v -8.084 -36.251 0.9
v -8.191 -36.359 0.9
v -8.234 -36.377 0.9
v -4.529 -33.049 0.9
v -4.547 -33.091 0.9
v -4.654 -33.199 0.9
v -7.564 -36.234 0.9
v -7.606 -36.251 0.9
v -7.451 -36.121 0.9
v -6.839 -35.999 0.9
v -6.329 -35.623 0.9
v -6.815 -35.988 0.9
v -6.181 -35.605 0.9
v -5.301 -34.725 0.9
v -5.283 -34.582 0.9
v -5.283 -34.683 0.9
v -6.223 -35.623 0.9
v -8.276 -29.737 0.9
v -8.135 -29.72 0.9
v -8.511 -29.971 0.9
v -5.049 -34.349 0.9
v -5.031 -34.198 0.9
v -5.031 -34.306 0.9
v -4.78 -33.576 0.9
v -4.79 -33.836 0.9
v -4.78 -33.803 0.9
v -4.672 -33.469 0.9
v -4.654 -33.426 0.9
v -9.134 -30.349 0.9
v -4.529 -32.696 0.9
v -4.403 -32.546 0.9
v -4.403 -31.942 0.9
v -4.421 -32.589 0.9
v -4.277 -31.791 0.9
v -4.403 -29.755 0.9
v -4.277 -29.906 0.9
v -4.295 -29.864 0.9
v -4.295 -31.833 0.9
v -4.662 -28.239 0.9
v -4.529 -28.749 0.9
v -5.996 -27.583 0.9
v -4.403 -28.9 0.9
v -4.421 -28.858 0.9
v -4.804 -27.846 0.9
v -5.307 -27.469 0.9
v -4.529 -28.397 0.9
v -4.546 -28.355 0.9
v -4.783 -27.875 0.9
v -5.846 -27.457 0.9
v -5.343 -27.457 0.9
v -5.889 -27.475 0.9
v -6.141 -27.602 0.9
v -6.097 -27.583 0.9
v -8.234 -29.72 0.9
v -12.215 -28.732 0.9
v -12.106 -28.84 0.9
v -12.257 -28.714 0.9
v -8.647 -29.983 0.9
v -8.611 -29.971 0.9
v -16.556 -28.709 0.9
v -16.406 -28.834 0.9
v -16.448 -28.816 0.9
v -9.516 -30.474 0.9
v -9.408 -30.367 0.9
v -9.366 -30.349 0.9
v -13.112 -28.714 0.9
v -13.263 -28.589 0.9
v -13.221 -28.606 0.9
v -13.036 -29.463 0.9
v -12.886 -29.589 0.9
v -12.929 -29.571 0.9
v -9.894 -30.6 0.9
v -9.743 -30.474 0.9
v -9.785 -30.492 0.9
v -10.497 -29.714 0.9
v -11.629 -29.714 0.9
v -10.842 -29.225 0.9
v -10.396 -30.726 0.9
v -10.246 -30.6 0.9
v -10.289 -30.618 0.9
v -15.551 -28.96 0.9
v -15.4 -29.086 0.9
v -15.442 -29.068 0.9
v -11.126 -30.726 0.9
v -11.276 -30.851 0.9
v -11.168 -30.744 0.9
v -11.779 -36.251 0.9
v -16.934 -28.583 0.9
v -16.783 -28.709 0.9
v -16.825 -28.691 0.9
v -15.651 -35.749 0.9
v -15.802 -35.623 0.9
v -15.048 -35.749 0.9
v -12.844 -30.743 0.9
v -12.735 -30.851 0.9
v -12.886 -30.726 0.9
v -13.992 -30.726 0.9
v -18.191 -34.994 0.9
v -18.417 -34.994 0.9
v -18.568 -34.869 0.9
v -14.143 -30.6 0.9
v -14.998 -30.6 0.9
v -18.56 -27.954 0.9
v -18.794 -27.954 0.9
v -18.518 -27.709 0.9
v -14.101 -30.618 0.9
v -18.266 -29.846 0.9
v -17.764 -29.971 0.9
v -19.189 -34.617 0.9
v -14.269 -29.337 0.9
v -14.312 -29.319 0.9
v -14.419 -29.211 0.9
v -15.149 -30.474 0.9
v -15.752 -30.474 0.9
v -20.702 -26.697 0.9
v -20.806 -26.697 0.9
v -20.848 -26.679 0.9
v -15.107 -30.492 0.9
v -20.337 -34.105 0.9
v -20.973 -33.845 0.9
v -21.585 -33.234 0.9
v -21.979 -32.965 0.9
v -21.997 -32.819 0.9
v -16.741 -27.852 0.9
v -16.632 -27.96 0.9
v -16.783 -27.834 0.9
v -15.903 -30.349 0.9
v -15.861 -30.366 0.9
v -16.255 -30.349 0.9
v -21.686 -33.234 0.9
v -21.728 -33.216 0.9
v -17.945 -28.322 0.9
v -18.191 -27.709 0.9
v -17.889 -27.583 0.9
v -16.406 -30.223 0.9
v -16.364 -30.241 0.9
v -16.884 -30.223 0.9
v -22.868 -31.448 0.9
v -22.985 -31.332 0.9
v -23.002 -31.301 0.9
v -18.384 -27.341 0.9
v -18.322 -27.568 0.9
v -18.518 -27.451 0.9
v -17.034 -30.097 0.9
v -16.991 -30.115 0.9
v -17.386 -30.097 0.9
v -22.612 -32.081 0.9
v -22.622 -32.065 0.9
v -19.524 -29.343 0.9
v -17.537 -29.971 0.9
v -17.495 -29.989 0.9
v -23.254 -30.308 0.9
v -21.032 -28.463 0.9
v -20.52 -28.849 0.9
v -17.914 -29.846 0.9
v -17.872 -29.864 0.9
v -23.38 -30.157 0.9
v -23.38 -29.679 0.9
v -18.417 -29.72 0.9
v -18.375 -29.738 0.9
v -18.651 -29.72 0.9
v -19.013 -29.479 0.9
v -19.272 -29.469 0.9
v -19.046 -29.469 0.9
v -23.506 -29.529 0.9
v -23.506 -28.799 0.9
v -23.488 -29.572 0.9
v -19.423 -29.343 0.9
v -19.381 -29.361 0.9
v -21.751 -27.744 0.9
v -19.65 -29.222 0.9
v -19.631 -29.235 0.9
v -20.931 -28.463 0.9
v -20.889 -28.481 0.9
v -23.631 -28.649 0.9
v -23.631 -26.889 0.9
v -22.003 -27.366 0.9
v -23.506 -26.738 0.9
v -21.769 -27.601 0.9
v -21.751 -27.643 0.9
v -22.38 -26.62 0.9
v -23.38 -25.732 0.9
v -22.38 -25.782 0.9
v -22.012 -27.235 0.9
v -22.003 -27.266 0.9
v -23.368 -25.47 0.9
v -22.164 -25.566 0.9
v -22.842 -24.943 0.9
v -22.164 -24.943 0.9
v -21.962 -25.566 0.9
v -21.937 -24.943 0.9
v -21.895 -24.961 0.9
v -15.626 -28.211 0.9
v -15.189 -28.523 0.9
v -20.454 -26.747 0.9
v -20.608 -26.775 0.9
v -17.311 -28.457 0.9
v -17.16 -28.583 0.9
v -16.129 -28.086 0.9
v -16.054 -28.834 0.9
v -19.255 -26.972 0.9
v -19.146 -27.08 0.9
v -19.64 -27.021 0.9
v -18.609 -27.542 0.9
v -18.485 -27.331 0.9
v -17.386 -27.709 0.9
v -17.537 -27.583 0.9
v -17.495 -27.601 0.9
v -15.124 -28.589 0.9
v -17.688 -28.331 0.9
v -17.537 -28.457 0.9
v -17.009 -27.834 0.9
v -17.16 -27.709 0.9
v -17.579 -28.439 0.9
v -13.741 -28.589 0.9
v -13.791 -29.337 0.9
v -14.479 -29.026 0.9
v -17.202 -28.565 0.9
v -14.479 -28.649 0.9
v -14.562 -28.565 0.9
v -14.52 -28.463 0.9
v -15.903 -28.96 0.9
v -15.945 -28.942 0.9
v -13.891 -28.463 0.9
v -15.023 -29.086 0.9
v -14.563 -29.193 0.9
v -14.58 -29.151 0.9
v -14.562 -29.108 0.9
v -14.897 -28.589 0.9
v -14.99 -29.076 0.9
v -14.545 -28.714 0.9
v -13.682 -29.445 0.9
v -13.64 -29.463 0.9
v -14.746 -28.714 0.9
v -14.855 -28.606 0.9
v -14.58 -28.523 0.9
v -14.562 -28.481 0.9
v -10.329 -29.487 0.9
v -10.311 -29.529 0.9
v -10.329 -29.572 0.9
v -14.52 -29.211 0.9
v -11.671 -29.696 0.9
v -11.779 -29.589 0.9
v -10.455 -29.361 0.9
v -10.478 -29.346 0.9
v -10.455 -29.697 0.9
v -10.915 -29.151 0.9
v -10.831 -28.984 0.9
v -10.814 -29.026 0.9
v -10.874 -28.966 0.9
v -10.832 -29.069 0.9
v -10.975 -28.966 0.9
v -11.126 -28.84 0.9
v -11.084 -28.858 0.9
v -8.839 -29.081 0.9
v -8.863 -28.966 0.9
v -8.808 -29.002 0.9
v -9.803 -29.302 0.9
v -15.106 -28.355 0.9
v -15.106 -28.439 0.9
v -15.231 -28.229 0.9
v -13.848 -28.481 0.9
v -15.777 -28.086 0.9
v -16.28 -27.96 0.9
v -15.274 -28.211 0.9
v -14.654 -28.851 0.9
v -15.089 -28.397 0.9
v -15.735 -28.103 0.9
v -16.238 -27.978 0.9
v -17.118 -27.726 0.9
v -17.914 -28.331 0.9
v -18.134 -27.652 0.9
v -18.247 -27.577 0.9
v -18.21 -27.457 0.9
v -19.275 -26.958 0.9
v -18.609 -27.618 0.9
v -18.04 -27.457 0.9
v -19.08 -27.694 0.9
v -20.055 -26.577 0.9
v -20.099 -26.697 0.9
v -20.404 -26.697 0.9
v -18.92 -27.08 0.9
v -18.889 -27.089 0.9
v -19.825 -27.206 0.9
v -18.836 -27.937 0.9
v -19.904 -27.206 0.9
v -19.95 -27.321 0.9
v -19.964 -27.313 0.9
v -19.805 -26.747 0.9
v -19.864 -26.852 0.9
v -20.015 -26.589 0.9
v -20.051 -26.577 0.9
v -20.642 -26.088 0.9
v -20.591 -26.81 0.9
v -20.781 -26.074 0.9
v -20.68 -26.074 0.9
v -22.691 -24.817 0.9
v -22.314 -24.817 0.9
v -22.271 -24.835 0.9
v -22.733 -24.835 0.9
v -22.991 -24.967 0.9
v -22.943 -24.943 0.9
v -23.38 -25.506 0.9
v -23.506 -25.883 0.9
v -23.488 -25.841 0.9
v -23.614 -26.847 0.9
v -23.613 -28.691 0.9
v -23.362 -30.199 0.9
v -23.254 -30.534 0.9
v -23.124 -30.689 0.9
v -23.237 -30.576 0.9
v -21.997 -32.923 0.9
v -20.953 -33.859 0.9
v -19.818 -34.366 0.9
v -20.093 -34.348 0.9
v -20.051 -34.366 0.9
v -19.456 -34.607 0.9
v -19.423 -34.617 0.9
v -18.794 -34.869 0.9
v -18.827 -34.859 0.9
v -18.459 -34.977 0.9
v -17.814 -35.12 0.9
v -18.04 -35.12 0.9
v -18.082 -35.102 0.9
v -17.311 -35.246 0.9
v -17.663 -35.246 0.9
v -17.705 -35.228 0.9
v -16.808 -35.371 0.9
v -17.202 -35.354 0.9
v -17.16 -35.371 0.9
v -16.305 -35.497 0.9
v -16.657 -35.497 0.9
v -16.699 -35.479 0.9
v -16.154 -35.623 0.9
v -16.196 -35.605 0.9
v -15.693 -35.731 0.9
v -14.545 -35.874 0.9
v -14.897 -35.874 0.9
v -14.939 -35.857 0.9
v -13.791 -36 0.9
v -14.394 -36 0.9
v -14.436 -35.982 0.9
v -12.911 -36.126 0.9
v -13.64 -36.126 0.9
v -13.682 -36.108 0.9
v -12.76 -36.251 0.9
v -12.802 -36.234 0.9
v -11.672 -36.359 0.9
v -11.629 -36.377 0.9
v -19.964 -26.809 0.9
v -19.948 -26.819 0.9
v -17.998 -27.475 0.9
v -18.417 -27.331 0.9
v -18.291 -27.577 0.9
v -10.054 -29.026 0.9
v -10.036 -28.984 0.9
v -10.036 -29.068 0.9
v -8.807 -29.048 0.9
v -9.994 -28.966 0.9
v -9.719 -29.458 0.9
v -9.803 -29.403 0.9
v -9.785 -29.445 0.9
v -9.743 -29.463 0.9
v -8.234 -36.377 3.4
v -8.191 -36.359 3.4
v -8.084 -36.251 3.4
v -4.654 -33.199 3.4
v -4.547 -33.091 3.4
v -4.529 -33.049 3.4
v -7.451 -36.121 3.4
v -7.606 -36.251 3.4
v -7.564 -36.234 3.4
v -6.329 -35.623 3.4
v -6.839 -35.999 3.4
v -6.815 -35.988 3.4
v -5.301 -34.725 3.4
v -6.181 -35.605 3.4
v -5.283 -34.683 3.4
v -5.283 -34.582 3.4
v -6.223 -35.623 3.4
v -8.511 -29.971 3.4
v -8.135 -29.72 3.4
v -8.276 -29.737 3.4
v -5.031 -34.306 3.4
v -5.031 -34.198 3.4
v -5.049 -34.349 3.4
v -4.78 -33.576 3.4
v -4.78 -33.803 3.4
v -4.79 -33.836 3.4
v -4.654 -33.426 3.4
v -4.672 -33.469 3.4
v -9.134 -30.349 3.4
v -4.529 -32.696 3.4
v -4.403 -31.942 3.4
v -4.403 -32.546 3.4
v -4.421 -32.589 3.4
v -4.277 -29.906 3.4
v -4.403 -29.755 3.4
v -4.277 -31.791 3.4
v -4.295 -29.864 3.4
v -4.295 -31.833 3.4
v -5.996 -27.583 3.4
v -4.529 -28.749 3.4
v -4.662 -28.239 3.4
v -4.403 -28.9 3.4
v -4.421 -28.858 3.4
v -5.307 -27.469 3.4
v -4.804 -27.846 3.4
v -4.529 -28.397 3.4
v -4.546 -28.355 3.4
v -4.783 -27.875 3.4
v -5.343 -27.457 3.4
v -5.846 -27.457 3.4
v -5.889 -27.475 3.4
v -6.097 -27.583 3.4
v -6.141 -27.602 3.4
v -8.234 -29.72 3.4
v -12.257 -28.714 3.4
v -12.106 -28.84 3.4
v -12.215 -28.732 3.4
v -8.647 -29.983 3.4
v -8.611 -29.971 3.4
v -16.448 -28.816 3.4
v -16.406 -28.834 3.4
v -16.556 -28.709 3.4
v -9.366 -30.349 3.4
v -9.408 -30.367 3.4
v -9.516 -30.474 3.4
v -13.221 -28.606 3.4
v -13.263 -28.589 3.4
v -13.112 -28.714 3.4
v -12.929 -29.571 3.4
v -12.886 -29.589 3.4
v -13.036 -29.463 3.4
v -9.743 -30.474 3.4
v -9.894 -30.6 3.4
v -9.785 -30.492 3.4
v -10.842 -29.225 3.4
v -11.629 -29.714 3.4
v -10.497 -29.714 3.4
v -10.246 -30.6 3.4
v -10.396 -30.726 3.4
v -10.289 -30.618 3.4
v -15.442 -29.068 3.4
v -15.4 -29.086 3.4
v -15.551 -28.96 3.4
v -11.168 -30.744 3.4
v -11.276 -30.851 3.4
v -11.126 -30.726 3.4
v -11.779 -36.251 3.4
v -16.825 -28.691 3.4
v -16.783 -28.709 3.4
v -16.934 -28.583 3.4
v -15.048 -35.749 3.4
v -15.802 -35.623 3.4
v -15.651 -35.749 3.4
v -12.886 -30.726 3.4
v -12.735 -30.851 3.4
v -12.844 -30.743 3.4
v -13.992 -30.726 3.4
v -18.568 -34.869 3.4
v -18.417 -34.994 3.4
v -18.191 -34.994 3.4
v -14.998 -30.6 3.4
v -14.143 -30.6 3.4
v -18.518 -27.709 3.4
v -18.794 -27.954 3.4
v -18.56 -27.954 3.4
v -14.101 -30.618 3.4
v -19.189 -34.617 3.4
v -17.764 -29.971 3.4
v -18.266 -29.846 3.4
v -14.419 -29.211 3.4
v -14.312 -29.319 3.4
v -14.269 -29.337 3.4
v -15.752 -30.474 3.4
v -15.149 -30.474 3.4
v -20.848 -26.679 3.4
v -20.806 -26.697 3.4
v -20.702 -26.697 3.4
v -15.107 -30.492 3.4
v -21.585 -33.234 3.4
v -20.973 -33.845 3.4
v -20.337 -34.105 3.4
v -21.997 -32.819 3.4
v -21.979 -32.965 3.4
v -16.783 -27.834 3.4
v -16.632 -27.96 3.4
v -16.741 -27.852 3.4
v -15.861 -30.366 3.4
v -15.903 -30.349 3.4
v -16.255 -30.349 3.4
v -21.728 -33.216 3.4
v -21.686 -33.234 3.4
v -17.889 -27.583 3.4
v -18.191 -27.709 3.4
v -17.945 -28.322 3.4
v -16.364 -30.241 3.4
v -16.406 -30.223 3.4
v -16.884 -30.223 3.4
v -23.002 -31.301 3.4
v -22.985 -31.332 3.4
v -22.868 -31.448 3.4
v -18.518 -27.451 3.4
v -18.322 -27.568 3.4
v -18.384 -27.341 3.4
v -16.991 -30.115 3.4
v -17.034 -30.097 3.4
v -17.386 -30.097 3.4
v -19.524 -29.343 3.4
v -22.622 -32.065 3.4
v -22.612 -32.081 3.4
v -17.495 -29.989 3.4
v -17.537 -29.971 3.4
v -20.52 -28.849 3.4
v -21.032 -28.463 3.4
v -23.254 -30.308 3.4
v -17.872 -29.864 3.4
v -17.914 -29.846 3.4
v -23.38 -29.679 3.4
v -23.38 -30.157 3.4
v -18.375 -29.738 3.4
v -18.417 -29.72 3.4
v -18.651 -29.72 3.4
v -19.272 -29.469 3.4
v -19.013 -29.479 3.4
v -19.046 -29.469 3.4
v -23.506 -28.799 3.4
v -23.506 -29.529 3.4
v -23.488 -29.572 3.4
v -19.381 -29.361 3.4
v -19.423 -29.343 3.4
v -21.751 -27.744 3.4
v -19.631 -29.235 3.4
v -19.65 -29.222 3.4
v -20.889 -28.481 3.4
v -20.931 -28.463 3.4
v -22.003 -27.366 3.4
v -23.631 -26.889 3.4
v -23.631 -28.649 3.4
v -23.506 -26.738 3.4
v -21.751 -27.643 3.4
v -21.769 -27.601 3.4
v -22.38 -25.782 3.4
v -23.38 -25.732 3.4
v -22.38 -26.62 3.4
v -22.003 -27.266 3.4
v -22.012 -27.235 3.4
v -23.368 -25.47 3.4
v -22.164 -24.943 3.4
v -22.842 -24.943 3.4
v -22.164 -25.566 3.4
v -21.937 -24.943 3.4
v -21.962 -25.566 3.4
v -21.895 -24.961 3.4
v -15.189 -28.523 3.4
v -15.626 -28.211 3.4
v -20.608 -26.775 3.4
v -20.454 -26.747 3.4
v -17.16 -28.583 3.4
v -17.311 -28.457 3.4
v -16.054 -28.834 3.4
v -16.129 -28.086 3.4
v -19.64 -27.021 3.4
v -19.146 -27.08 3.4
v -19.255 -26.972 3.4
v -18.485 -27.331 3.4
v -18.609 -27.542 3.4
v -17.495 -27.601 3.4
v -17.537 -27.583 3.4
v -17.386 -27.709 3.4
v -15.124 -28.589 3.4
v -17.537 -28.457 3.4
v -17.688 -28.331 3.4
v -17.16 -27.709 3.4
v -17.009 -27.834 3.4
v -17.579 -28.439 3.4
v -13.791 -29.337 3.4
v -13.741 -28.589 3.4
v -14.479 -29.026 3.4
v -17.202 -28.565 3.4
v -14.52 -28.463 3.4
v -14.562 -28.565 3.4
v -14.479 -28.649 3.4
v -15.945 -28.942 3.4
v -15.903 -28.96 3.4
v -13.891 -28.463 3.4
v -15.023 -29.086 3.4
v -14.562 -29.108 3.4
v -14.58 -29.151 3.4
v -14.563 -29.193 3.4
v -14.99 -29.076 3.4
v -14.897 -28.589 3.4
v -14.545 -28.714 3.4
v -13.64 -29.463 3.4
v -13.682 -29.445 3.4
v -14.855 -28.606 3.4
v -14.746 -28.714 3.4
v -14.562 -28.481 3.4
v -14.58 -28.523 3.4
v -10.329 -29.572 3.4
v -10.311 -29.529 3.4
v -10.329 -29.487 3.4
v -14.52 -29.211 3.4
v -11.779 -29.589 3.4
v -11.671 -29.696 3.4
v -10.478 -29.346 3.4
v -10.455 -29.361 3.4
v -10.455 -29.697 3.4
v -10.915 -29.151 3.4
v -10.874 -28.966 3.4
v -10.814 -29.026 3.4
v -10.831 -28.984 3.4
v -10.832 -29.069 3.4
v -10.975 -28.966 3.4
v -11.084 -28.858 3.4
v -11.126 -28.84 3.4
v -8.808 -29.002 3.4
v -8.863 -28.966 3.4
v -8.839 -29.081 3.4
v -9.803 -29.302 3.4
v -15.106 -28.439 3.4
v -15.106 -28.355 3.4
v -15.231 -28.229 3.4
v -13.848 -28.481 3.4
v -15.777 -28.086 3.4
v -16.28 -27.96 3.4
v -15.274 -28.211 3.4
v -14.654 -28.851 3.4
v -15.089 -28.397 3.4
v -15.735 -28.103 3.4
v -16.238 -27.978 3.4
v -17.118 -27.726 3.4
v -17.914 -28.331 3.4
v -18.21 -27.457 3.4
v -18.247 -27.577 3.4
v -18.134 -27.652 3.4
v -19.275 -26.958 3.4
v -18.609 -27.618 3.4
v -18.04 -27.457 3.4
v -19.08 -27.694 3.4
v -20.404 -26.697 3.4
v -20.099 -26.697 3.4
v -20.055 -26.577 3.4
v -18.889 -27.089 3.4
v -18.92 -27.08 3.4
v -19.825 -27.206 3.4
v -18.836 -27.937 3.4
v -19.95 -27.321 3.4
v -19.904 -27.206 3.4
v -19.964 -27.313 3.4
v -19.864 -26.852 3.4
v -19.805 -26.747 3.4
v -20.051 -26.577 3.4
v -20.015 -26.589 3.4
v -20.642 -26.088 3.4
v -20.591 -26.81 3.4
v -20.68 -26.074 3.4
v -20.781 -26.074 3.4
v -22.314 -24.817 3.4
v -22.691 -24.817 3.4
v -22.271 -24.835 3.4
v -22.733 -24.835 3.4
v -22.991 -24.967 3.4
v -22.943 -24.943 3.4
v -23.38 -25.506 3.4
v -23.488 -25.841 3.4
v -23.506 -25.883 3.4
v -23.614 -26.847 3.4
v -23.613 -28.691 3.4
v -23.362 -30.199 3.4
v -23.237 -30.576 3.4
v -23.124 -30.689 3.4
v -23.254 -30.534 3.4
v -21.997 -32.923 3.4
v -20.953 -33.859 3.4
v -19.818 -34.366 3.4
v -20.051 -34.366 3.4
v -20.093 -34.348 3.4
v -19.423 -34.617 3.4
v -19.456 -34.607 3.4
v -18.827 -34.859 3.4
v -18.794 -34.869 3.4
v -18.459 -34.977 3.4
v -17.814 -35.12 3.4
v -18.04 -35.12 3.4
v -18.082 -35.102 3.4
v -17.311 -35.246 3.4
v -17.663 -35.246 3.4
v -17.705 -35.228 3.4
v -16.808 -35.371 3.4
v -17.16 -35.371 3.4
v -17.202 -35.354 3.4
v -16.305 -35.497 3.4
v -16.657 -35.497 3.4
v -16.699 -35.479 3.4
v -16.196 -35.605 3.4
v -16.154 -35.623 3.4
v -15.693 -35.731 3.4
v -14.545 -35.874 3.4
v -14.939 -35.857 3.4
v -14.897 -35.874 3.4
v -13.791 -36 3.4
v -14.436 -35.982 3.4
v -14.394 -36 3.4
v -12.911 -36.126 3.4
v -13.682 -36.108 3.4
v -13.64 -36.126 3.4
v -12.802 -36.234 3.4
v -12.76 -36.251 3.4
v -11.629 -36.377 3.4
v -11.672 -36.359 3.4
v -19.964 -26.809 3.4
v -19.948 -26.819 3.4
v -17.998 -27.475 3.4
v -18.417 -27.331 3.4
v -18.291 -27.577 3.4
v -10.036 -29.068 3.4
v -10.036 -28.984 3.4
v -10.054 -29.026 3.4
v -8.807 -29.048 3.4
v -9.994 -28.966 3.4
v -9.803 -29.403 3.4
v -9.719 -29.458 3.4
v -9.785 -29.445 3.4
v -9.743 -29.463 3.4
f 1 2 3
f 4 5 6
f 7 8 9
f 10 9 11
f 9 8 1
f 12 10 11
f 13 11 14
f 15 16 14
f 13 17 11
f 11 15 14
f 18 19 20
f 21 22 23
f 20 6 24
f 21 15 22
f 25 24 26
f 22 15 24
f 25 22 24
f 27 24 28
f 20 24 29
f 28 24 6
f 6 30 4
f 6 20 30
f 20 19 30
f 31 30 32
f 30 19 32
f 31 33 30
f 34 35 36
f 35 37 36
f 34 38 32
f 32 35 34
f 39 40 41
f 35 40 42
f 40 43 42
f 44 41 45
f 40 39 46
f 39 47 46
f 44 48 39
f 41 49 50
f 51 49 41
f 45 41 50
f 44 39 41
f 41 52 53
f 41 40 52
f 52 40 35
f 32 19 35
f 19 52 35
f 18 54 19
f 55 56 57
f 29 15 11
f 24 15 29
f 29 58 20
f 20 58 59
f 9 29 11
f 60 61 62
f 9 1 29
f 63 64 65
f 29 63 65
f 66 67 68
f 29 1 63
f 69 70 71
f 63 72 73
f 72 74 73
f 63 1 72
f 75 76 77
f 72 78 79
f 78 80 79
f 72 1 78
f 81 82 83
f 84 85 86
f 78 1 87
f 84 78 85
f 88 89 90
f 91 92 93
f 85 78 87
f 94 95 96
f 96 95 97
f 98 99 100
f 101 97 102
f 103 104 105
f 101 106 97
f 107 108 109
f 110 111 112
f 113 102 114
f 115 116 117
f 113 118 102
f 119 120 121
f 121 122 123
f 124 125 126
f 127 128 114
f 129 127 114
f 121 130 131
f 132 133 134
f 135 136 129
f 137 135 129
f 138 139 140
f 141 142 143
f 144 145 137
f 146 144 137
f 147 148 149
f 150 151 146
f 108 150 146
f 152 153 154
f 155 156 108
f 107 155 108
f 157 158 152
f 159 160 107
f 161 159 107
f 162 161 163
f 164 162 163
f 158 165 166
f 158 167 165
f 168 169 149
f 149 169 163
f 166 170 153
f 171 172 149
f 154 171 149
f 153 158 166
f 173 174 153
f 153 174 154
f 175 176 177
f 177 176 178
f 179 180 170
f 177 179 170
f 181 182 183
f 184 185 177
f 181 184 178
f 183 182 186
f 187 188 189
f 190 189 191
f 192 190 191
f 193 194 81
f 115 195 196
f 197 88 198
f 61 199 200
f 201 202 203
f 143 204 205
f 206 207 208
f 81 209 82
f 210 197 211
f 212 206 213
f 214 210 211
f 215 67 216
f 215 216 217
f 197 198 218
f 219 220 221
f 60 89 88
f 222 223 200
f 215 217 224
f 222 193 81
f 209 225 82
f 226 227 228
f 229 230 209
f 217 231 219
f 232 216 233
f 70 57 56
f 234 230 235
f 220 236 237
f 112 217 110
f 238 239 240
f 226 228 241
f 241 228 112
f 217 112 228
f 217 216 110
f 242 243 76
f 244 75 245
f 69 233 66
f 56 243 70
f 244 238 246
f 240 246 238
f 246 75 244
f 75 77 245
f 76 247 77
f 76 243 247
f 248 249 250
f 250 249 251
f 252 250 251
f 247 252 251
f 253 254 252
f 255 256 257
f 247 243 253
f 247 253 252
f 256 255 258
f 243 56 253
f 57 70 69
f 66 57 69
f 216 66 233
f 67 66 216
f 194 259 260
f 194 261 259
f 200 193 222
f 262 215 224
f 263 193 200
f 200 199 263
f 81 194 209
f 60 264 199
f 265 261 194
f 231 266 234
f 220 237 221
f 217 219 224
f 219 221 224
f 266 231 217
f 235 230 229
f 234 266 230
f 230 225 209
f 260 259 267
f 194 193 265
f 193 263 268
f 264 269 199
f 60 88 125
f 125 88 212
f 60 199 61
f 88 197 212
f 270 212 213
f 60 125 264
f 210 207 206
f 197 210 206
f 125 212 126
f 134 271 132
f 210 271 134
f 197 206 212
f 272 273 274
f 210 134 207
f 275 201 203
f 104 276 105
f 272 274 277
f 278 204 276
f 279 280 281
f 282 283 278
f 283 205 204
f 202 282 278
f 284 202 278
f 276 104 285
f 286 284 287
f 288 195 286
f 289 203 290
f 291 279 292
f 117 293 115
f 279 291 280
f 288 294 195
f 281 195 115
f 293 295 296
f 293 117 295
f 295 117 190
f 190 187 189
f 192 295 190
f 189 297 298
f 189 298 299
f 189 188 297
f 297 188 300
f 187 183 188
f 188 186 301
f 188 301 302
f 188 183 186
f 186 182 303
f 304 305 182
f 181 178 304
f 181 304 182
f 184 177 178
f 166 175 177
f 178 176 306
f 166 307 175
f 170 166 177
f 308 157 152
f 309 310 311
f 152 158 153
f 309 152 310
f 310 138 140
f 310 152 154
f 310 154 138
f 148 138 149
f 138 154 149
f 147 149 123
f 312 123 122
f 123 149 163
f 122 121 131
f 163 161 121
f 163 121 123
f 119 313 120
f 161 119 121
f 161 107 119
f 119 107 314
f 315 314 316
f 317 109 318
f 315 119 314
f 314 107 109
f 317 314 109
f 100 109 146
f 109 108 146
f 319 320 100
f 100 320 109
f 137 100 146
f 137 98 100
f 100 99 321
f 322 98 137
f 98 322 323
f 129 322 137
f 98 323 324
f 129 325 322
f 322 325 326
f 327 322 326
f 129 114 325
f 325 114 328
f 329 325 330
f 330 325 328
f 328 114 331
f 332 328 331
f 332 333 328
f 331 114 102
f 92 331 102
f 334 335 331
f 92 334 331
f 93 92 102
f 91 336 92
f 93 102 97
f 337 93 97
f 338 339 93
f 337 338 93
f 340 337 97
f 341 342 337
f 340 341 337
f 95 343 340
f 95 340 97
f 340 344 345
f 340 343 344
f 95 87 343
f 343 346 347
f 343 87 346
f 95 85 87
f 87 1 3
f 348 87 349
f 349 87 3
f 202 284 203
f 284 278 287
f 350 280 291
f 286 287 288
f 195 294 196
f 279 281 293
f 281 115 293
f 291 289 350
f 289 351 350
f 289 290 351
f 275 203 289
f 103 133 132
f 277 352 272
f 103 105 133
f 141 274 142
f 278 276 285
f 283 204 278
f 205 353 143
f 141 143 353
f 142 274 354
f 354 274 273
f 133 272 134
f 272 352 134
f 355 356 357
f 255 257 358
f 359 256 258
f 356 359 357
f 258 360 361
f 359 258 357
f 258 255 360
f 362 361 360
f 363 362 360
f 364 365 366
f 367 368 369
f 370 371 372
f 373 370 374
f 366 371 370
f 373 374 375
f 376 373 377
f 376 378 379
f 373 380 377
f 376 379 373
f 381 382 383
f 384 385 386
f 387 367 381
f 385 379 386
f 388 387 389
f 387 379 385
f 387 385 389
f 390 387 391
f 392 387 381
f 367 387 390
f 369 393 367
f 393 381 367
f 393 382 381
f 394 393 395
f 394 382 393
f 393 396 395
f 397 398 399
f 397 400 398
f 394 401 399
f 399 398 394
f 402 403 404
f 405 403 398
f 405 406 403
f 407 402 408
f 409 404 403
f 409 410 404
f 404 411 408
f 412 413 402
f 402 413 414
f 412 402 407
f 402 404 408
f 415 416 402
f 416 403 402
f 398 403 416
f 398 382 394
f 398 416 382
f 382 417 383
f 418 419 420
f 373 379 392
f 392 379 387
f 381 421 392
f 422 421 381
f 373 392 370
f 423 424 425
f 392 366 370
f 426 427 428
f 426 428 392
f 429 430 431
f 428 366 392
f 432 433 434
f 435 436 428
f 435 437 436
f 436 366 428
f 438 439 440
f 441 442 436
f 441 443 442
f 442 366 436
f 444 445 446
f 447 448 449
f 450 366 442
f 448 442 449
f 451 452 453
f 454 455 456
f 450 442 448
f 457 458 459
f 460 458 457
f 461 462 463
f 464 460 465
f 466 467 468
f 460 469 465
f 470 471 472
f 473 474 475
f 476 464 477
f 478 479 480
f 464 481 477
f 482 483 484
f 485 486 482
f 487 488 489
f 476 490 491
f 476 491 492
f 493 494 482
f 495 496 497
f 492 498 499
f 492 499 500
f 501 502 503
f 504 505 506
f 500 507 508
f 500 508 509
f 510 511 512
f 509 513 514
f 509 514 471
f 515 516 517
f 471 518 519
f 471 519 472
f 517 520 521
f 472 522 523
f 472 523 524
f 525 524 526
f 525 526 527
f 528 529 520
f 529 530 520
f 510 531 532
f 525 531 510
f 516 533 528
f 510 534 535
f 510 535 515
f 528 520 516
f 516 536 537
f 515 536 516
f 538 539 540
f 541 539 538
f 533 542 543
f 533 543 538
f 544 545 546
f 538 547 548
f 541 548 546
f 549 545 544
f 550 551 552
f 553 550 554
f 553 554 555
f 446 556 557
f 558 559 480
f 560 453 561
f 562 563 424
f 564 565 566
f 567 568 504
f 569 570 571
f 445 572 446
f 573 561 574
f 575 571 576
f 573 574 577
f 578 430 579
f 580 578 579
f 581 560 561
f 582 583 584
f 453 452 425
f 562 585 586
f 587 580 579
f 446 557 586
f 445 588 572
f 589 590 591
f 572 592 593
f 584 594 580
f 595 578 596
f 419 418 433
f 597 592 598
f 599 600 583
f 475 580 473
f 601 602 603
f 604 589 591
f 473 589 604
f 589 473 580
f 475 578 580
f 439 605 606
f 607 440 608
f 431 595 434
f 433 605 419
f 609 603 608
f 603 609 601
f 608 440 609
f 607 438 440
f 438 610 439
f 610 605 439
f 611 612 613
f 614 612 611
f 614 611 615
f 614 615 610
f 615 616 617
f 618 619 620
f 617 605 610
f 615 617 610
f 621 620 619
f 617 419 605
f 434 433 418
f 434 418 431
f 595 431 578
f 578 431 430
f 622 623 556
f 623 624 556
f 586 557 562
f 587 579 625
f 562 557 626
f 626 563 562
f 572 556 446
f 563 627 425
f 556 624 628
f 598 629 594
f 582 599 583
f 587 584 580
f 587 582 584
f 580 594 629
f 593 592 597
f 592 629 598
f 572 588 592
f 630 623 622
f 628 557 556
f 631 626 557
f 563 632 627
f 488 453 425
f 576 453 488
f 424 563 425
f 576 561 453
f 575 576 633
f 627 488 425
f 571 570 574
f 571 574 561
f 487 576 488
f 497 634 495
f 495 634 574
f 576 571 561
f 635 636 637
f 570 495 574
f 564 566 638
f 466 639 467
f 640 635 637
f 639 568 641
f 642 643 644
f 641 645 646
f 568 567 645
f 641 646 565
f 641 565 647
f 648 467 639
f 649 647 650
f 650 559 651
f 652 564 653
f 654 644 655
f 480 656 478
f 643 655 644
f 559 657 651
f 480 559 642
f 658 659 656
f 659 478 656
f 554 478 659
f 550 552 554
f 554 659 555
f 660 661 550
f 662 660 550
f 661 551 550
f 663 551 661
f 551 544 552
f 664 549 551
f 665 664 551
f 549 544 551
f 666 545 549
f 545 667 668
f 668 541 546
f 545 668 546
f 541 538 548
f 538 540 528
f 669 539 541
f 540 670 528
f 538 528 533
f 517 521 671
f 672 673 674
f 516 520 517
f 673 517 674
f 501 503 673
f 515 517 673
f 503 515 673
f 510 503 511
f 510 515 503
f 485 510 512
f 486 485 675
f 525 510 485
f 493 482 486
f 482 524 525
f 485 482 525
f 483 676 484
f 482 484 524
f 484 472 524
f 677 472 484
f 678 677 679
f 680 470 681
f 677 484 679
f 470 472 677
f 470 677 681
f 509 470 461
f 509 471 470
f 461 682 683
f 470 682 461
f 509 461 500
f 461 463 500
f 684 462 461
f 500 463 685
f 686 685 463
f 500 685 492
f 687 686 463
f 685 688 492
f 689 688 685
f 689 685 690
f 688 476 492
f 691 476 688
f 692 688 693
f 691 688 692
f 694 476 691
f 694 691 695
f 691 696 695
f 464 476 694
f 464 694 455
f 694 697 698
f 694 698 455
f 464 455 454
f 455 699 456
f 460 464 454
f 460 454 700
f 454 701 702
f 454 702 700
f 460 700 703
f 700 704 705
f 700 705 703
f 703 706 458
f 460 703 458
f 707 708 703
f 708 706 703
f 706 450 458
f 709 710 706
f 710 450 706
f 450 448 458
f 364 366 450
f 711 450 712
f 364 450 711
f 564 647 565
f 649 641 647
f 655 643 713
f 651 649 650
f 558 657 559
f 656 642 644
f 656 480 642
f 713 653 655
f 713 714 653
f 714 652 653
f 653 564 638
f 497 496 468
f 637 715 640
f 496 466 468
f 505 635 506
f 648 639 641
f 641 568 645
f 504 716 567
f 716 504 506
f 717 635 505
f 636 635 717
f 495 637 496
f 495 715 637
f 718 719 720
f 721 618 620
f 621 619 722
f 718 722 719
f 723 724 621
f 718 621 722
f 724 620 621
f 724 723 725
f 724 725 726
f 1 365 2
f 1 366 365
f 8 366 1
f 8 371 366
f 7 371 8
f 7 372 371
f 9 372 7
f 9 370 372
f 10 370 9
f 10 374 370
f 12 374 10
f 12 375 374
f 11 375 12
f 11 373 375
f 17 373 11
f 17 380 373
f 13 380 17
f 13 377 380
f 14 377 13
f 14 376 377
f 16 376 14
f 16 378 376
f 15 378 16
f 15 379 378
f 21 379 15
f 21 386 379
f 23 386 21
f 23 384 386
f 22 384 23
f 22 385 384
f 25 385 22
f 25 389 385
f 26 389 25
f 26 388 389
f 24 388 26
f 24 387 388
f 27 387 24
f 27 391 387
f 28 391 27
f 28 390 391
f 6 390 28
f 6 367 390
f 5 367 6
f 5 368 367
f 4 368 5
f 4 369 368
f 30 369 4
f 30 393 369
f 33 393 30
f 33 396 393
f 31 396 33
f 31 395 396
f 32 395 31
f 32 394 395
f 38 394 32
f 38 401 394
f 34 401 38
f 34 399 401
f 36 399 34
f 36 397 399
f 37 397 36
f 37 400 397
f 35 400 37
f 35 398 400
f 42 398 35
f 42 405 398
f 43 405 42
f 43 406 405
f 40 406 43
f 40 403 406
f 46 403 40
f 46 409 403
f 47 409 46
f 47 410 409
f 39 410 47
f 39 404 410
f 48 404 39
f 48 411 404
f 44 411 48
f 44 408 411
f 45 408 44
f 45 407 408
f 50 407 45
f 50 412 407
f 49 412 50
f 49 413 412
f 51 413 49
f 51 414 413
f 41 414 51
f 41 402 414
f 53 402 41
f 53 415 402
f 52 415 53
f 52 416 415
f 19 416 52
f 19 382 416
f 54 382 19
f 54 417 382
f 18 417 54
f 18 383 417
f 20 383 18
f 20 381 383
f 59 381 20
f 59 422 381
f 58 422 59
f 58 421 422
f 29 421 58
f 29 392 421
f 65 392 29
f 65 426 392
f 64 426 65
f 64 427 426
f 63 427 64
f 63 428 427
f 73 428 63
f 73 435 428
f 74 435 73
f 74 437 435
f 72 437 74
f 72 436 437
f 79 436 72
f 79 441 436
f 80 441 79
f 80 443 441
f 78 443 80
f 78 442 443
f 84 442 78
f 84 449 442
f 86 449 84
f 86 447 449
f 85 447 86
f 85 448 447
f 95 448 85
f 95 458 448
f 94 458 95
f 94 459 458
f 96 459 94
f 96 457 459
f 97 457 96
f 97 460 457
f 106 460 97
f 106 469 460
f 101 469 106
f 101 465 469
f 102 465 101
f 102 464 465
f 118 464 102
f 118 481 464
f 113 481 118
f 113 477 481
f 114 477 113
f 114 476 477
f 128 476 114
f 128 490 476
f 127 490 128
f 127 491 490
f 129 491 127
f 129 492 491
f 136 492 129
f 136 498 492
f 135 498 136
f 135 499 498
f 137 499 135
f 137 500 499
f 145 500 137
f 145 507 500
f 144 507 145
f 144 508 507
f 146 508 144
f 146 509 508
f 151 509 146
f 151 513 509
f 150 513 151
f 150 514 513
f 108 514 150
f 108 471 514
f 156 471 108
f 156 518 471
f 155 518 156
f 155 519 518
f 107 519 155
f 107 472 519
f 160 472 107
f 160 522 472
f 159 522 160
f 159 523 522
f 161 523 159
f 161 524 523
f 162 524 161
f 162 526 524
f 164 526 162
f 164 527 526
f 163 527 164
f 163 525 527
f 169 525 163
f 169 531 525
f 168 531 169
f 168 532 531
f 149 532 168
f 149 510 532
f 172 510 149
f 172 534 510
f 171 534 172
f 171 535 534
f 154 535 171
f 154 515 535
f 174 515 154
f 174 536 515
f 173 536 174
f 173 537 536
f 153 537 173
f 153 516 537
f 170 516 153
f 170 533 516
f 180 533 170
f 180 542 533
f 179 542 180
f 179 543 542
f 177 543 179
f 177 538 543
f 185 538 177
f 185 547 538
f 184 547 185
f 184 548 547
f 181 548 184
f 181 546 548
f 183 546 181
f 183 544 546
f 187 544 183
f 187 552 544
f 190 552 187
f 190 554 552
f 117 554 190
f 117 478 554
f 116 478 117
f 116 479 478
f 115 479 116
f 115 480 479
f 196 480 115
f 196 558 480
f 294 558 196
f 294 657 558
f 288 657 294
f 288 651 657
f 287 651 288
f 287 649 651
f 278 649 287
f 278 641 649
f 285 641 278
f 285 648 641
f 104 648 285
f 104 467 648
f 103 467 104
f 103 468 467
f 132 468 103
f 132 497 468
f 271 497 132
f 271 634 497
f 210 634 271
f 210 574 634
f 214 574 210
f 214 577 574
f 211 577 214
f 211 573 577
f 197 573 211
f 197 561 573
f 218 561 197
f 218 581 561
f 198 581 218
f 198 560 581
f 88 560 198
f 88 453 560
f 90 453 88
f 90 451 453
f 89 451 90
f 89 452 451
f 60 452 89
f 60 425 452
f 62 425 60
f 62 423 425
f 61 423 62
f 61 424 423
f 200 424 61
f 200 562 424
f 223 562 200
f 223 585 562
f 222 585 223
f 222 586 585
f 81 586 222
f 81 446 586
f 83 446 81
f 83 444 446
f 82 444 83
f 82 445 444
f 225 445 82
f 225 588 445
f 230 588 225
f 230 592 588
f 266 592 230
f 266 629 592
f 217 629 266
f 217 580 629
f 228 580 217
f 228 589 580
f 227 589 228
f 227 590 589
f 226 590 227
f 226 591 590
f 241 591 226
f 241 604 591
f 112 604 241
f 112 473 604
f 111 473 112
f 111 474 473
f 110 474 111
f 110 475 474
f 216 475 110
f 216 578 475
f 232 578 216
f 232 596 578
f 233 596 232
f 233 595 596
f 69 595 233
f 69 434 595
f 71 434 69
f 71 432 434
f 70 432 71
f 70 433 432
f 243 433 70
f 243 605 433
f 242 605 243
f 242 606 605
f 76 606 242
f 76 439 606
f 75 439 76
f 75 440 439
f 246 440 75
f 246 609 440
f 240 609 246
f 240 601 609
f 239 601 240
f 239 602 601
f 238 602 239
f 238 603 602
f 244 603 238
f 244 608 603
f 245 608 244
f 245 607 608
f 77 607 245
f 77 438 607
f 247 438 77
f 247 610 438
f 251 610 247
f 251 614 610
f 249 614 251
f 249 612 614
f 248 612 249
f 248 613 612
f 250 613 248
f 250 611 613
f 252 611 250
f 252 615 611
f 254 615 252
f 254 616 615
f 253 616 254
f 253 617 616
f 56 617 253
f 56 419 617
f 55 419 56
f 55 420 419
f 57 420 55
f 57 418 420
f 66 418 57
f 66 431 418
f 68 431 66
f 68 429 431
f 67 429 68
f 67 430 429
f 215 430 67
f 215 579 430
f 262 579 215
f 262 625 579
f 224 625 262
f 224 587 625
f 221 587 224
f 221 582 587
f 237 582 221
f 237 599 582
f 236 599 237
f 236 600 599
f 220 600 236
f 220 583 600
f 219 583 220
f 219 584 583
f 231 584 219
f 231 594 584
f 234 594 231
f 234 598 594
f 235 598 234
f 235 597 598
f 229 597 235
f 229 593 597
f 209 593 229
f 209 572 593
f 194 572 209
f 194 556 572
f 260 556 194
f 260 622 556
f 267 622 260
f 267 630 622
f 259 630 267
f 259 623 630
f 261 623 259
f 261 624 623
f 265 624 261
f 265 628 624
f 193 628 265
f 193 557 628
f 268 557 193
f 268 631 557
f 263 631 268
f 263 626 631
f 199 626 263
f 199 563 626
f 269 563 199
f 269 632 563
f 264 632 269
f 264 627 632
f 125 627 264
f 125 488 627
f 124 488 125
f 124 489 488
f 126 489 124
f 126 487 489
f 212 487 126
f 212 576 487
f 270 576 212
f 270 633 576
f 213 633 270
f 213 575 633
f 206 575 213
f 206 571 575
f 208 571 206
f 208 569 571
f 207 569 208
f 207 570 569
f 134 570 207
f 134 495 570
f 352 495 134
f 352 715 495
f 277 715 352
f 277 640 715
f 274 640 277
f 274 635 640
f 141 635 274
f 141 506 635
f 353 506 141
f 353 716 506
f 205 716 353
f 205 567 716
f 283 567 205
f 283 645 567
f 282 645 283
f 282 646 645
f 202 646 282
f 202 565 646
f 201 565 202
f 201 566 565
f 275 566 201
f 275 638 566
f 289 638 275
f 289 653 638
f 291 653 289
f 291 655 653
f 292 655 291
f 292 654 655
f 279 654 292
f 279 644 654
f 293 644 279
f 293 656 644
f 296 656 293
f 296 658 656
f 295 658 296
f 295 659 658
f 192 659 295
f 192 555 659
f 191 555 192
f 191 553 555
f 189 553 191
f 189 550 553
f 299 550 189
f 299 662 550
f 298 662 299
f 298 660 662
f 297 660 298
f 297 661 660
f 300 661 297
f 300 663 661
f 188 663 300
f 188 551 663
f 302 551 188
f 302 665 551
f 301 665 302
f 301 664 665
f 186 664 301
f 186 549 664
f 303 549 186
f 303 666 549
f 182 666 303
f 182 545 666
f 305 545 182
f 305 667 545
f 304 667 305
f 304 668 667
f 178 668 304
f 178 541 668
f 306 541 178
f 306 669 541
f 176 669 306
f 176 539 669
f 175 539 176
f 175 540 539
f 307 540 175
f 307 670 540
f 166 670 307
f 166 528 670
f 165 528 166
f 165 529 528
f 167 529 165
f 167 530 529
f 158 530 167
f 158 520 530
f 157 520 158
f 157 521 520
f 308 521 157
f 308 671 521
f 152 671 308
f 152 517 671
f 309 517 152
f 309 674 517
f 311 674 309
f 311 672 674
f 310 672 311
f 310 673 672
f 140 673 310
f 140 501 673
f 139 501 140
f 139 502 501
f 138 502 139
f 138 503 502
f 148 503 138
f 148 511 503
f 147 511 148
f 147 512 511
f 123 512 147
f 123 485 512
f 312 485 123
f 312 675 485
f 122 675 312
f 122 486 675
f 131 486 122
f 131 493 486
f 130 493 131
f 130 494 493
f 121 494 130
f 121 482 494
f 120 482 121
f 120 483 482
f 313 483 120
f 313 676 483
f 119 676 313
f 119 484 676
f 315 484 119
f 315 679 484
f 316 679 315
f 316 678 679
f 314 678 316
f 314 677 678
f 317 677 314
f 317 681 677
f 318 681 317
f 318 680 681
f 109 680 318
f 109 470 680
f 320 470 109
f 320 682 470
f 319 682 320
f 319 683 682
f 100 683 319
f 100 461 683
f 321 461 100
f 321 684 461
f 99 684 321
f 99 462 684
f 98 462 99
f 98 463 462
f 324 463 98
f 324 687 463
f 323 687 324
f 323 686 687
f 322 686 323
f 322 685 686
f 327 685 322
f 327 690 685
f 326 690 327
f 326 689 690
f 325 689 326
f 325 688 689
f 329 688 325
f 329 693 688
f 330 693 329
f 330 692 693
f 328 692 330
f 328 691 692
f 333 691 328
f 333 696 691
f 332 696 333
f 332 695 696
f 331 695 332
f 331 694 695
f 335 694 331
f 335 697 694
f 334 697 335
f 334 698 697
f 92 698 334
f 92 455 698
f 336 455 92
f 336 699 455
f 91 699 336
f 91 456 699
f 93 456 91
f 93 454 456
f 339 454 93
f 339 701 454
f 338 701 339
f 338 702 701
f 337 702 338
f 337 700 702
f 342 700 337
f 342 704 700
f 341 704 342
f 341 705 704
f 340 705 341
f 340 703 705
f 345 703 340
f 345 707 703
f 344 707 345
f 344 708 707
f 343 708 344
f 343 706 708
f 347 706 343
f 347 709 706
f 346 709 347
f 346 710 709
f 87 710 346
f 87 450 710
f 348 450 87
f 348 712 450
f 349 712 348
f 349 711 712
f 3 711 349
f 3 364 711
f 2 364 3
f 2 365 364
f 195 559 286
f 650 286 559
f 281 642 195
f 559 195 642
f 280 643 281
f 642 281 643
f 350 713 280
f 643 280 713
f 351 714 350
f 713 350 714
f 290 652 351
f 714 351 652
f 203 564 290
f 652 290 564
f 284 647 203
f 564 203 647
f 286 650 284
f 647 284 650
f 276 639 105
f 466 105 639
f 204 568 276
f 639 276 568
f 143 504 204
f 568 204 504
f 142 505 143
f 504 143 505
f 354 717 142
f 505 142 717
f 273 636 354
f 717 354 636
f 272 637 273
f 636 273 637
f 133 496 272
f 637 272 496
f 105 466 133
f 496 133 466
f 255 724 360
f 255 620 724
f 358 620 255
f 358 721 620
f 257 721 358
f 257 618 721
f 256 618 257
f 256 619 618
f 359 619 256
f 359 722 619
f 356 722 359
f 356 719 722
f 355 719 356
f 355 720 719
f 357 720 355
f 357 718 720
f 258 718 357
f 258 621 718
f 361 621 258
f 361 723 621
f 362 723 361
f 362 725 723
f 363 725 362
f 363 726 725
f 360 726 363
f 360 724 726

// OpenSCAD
$fn = 24;
translate([0, -2.500, 0.900])
  linear_extrude(height=2.500) {
offset(r=0.06, $fn=8) {
    polygon(points=[[-23.320,-23.006],[-23.320,-23.257],[-23.446,-23.383],[-23.446,-24.263],[-23.571,-24.389],[-23.571,-26.149],[-23.446,-26.274],[-23.446,-27.029],[-23.320,-27.154],[-23.320,-27.657],[-23.194,-27.783],[-23.194,-28.034],[-23.069,-28.160],[-22.943,-28.789],[-22.817,-28.914],[-22.566,-29.543],[-21.937,-30.297],[-21.937,-30.423],[-21.686,-30.674],[-21.560,-30.674],[-20.931,-31.303],[-20.303,-31.554],[-20.051,-31.806],[-19.800,-31.806],[-19.423,-32.057],[-19.171,-32.057],[-18.794,-32.309],[-18.543,-32.309],[-18.417,-32.434],[-18.166,-32.434],[-18.040,-32.560],[-17.789,-32.560],[-17.663,-32.686],[-17.286,-32.686],[-17.160,-32.811],[-16.783,-32.811],[-16.657,-32.937],[-16.280,-32.937],[-16.154,-33.063],[-15.777,-33.063],[-15.651,-33.189],[-15.023,-33.189],[-14.897,-33.314],[-14.520,-33.314],[-14.394,-33.440],[-13.766,-33.440],[-13.640,-33.566],[-12.886,-33.566],[-12.760,-33.691],[-11.754,-33.691],[-11.629,-33.817],[-8.234,-33.817],[-8.109,-33.691],[-7.606,-33.691],[-7.480,-33.566],[-6.851,-33.440],[-6.349,-33.063],[-6.223,-33.063],[-5.343,-32.183],[-5.343,-32.057],[-5.091,-31.806],[-5.091,-31.680],[-4.840,-31.303],[-4.840,-31.051],[-4.714,-30.926],[-4.714,-30.674],[-4.589,-30.549],[-4.589,-30.171],[-4.463,-30.046],[-4.463,-29.417],[-4.337,-29.291],[-4.337,-27.406],[-4.463,-27.280],[-4.463,-26.400],[-4.589,-26.274],[-4.589,-25.897],[-4.714,-25.771],[-4.840,-25.394],[-5.343,-25.017],[-5.846,-25.017],[-5.971,-25.143],[-6.097,-25.143],[-8.109,-27.280],[-8.234,-27.280],[-8.486,-27.531],[-8.611,-27.531],[-9.114,-27.909],[-9.366,-27.909],[-9.491,-28.034],[-9.743,-28.034],[-9.869,-28.160],[-10.246,-28.160],[-10.371,-28.286],[-11.126,-28.286],[-11.251,-28.411],[-12.760,-28.411],[-12.886,-28.286],[-14.017,-28.286],[-14.143,-28.160],[-15.023,-28.160],[-15.149,-28.034],[-15.777,-28.034],[-15.903,-27.909],[-16.280,-27.909],[-16.406,-27.783],[-16.909,-27.783],[-17.034,-27.657],[-17.411,-27.657],[-17.537,-27.531],[-17.789,-27.531],[-17.914,-27.406],[-18.291,-27.406],[-18.417,-27.280],[-18.669,-27.280],[-19.046,-27.029],[-19.297,-27.029],[-19.423,-26.903],[-19.549,-26.903],[-19.674,-26.777],[-20.554,-26.400],[-20.931,-26.023],[-21.057,-26.023],[-21.811,-25.269],[-21.811,-25.143],[-22.063,-24.891],[-22.063,-24.766],[-22.440,-24.137],[-22.440,-23.257],[-22.189,-23.006],[-21.937,-23.006],[-20.806,-24.137],[-20.680,-24.137],[-19.926,-24.766],[-19.046,-25.143],[-18.794,-25.394],[-18.543,-25.394],[-17.914,-25.771],[-17.663,-25.771],[-17.537,-25.897],[-17.286,-25.897],[-17.160,-26.023],[-16.909,-26.023],[-16.783,-26.149],[-16.531,-26.149],[-16.406,-26.274],[-16.029,-26.274],[-15.903,-26.400],[-15.526,-26.400],[-15.400,-26.526],[-15.023,-26.526],[-14.897,-26.651],[-14.394,-26.651],[-14.269,-26.777],[-13.766,-26.777],[-13.640,-26.903],[-13.011,-26.903],[-12.886,-27.029],[-11.754,-27.029],[-11.629,-27.154],[-10.497,-27.154],[-10.371,-27.029],[-9.994,-27.029],[-10.371,-27.029],[-10.497,-26.903],[-10.874,-26.777],[-11.000,-26.651],[-10.874,-26.526],[-9.994,-26.526],[-9.743,-26.777],[-9.743,-26.903],[-8.863,-26.526],[-11.000,-26.526],[-11.126,-26.400],[-12.131,-26.400],[-12.257,-26.274],[-13.137,-26.274],[-13.263,-26.149],[-13.766,-26.149],[-13.891,-26.023],[-14.520,-26.023],[-14.646,-25.897],[-15.149,-25.897],[-15.274,-25.771],[-15.651,-25.771],[-15.777,-25.646],[-16.154,-25.646],[-16.280,-25.520],[-16.657,-25.520],[-16.783,-25.394],[-17.034,-25.394],[-17.160,-25.269],[-17.411,-25.269],[-17.537,-25.143],[-17.914,-25.143],[-18.040,-25.017],[-18.291,-25.017],[-18.920,-24.640],[-19.171,-24.640],[-19.297,-24.514],[-19.926,-24.263],[-20.680,-23.634],[-20.806,-23.634],[-21.937,-22.503],[-22.189,-22.503],[-22.314,-22.377],[-22.691,-22.377],[-22.817,-22.503],[-22.943,-22.503],[-15.023,-26.526],[-14.646,-26.274],[-14.394,-26.526],[-14.520,-26.651],[-14.897,-26.651],[-15.274,-26.023],[-15.149,-25.897],[-14.646,-25.897],[-14.394,-26.149],[-14.520,-26.274],[-14.771,-26.274],[-14.897,-26.149],[-15.149,-26.149],[-18.669,-25.017],[-18.543,-24.891],[-18.417,-24.891],[-18.040,-25.143],[-18.166,-25.269],[-18.543,-25.269],[-18.669,-25.143],[-20.554,-24.263],[-20.429,-24.137],[-20.051,-24.137],[-19.549,-24.514],[-19.800,-24.766],[-19.926,-24.766]], paths=[[0,1,2,3,4,5,6,7,8,9,10,11,12,13,14,15,16,17,18,19,20,21,22,23,24,25,26,27,28,29,30,31,32,33,34,35,36,37,38,39,40,41,42,43,44,45,46,47,48,49,50,51,52,53,54,55,56,57,58,59,60,61,62,63,64,65,66,67,68,69,70,71,72,73,74,75,76,77,78,79,80,81,82,83,84,85,86,87,88,89,90,91,92,93,94,95,96,97,98,99,100,101,102,103,104,105,106,107,108,109,110,111,112,113,114,115,116,117,118,119,120,121,122,123,124,125,126,127,128,129,130,131,132,133,134,135,136,137,138,139,140,141,142,143,144,145,146,147,148,149,150,151,152,153,154,155,156,157,158,159,160,161,162,163,164,165,166,167,168,169,170,171,172,173,174,175,176,177,178,179,180,181,182,183,184,185,186,187,188,189,190,191,192,193,194,195,196,197,198,199,200,201,202,203,204,205,206,207],[208,209,210,211,212],[213,214,215,216,217,218,219,220],[221,222,223,224,225,226,227],[228,229,230,231,232,233]]);
}
}
